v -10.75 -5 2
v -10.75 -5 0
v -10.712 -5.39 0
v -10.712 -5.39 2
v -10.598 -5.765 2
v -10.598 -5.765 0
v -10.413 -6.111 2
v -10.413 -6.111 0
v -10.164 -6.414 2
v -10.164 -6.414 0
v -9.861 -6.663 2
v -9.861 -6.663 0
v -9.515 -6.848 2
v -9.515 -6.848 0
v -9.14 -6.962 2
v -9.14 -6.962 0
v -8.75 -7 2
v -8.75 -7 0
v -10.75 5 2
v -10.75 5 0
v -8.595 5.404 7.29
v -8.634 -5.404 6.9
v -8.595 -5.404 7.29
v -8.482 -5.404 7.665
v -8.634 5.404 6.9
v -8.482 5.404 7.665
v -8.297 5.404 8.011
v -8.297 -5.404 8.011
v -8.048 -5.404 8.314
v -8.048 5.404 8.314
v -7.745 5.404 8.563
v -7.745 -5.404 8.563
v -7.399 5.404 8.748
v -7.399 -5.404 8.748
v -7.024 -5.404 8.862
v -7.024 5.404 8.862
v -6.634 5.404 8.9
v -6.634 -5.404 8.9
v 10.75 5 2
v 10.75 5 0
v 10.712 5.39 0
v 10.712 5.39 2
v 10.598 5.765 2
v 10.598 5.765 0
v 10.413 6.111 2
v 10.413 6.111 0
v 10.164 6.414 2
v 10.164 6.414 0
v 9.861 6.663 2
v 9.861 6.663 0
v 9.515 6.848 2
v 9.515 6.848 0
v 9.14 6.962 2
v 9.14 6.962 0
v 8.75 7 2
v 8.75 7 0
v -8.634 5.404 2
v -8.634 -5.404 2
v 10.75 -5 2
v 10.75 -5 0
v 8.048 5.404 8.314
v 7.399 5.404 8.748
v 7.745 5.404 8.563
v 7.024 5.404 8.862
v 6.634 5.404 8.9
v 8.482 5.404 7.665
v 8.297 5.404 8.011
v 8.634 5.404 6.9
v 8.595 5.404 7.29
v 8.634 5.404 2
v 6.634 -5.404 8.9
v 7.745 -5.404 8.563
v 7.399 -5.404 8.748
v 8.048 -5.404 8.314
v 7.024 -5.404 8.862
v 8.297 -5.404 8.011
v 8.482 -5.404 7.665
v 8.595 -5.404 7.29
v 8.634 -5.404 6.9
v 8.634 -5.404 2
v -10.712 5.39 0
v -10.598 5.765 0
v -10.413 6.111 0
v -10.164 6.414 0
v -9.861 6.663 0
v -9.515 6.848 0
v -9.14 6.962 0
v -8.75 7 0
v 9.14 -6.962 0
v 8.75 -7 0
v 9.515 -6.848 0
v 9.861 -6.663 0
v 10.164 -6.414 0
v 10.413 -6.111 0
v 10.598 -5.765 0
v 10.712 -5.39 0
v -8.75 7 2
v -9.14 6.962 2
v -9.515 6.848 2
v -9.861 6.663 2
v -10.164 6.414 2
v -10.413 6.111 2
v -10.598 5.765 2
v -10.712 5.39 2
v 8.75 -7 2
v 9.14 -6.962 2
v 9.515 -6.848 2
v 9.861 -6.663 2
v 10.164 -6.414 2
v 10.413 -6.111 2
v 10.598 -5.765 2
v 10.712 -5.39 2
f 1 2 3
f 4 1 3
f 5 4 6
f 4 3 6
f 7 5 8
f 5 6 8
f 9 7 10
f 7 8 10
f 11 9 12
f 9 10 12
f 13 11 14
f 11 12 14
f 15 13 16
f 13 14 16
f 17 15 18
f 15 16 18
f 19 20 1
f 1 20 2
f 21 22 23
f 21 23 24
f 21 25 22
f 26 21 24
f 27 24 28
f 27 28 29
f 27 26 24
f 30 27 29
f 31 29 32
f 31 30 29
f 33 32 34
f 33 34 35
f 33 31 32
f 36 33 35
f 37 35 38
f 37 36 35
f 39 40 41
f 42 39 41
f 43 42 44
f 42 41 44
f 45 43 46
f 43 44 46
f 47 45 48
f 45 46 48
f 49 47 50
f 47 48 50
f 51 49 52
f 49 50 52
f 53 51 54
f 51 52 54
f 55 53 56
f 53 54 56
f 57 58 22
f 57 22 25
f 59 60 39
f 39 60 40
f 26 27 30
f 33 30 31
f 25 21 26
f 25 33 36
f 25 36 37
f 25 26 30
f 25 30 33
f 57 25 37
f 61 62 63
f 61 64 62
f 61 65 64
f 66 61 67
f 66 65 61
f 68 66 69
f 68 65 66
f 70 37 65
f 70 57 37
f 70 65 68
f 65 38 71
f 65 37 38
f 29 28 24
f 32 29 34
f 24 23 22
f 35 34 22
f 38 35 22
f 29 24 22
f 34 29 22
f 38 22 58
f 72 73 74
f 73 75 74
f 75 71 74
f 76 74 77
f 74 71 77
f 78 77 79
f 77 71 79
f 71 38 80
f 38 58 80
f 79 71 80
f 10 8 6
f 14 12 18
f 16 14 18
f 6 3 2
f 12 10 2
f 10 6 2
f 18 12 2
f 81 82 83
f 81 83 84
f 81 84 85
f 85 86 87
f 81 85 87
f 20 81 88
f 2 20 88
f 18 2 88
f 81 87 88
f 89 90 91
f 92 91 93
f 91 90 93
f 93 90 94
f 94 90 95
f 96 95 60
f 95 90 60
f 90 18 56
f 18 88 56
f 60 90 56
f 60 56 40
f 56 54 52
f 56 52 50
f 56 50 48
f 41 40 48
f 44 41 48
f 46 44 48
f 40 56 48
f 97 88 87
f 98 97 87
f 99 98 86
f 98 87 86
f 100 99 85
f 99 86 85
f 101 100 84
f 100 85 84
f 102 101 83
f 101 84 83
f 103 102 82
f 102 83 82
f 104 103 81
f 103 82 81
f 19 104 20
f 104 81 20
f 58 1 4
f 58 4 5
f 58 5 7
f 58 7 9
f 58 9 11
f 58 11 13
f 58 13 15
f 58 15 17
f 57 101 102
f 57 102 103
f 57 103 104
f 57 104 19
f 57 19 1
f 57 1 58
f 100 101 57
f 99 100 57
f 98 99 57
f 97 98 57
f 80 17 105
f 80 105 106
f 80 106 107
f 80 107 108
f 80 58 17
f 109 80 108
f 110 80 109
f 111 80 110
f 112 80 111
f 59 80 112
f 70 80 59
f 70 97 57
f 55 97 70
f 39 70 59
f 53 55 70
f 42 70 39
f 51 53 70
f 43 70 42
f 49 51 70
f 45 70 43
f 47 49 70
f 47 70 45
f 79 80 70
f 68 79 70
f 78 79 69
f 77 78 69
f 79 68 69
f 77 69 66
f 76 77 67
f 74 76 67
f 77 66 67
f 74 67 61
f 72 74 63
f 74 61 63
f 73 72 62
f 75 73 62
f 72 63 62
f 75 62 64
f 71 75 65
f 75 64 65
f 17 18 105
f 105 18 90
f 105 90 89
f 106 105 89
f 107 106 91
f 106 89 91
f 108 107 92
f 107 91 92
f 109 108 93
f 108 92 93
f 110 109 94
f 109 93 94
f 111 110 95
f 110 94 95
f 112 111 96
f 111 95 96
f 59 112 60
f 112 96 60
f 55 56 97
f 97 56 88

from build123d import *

# Parameters (mm, degrees)
BOSS_EXTRUDE1_DEPTH = 2
SKETCH2_W           = 17.267499136
SKETCH2_H           = 10.808758156
BOSS_EXTRUDE2_DEPTH = 6.9
FILLET3_R           = 2


with BuildPart() as part:
    # Sketch1 → Boss-Extrude1 (new body)
    with BuildSketch(Plane.XY):
        with BuildLine():
            Line((-8.75, -7), (8.75, -7))
            ThreePointArc((8.75, -7), (10.164213562, -6.414213562), (10.75, -5))
            Line((10.75, -5), (10.75, 5))
            ThreePointArc((10.75, 5), (10.164213562, 6.414213562), (8.75, 7))
            Line((8.75, 7), (-8.75, 7))
            ThreePointArc((-8.75, 7), (-10.164213562, 6.414213562), (-10.75, 5))
            Line((-10.75, 5), (-10.75, -5))
            ThreePointArc((-10.75, -5), (-10.164213562, -6.414213562), (-8.75, -7))
        make_face()
    extrude(amount=BOSS_EXTRUDE1_DEPTH)

    # Sketch2 → Boss-Extrude2 (add)
    with BuildSketch(Plane.XY.offset(2)):
        Rectangle(SKETCH2_W, SKETCH2_H)
    extrude(amount=BOSS_EXTRUDE2_DEPTH)

    # Fillet3
    fillet3_edges = [part.edges().sort_by_distance(p)[0] for p in [
        (8.633749568, 0, 8.9),
        (-8.633749568, 0, 8.9),
    ]]
    fillet(fillet3_edges, radius=FILLET3_R)


solid = part.part
